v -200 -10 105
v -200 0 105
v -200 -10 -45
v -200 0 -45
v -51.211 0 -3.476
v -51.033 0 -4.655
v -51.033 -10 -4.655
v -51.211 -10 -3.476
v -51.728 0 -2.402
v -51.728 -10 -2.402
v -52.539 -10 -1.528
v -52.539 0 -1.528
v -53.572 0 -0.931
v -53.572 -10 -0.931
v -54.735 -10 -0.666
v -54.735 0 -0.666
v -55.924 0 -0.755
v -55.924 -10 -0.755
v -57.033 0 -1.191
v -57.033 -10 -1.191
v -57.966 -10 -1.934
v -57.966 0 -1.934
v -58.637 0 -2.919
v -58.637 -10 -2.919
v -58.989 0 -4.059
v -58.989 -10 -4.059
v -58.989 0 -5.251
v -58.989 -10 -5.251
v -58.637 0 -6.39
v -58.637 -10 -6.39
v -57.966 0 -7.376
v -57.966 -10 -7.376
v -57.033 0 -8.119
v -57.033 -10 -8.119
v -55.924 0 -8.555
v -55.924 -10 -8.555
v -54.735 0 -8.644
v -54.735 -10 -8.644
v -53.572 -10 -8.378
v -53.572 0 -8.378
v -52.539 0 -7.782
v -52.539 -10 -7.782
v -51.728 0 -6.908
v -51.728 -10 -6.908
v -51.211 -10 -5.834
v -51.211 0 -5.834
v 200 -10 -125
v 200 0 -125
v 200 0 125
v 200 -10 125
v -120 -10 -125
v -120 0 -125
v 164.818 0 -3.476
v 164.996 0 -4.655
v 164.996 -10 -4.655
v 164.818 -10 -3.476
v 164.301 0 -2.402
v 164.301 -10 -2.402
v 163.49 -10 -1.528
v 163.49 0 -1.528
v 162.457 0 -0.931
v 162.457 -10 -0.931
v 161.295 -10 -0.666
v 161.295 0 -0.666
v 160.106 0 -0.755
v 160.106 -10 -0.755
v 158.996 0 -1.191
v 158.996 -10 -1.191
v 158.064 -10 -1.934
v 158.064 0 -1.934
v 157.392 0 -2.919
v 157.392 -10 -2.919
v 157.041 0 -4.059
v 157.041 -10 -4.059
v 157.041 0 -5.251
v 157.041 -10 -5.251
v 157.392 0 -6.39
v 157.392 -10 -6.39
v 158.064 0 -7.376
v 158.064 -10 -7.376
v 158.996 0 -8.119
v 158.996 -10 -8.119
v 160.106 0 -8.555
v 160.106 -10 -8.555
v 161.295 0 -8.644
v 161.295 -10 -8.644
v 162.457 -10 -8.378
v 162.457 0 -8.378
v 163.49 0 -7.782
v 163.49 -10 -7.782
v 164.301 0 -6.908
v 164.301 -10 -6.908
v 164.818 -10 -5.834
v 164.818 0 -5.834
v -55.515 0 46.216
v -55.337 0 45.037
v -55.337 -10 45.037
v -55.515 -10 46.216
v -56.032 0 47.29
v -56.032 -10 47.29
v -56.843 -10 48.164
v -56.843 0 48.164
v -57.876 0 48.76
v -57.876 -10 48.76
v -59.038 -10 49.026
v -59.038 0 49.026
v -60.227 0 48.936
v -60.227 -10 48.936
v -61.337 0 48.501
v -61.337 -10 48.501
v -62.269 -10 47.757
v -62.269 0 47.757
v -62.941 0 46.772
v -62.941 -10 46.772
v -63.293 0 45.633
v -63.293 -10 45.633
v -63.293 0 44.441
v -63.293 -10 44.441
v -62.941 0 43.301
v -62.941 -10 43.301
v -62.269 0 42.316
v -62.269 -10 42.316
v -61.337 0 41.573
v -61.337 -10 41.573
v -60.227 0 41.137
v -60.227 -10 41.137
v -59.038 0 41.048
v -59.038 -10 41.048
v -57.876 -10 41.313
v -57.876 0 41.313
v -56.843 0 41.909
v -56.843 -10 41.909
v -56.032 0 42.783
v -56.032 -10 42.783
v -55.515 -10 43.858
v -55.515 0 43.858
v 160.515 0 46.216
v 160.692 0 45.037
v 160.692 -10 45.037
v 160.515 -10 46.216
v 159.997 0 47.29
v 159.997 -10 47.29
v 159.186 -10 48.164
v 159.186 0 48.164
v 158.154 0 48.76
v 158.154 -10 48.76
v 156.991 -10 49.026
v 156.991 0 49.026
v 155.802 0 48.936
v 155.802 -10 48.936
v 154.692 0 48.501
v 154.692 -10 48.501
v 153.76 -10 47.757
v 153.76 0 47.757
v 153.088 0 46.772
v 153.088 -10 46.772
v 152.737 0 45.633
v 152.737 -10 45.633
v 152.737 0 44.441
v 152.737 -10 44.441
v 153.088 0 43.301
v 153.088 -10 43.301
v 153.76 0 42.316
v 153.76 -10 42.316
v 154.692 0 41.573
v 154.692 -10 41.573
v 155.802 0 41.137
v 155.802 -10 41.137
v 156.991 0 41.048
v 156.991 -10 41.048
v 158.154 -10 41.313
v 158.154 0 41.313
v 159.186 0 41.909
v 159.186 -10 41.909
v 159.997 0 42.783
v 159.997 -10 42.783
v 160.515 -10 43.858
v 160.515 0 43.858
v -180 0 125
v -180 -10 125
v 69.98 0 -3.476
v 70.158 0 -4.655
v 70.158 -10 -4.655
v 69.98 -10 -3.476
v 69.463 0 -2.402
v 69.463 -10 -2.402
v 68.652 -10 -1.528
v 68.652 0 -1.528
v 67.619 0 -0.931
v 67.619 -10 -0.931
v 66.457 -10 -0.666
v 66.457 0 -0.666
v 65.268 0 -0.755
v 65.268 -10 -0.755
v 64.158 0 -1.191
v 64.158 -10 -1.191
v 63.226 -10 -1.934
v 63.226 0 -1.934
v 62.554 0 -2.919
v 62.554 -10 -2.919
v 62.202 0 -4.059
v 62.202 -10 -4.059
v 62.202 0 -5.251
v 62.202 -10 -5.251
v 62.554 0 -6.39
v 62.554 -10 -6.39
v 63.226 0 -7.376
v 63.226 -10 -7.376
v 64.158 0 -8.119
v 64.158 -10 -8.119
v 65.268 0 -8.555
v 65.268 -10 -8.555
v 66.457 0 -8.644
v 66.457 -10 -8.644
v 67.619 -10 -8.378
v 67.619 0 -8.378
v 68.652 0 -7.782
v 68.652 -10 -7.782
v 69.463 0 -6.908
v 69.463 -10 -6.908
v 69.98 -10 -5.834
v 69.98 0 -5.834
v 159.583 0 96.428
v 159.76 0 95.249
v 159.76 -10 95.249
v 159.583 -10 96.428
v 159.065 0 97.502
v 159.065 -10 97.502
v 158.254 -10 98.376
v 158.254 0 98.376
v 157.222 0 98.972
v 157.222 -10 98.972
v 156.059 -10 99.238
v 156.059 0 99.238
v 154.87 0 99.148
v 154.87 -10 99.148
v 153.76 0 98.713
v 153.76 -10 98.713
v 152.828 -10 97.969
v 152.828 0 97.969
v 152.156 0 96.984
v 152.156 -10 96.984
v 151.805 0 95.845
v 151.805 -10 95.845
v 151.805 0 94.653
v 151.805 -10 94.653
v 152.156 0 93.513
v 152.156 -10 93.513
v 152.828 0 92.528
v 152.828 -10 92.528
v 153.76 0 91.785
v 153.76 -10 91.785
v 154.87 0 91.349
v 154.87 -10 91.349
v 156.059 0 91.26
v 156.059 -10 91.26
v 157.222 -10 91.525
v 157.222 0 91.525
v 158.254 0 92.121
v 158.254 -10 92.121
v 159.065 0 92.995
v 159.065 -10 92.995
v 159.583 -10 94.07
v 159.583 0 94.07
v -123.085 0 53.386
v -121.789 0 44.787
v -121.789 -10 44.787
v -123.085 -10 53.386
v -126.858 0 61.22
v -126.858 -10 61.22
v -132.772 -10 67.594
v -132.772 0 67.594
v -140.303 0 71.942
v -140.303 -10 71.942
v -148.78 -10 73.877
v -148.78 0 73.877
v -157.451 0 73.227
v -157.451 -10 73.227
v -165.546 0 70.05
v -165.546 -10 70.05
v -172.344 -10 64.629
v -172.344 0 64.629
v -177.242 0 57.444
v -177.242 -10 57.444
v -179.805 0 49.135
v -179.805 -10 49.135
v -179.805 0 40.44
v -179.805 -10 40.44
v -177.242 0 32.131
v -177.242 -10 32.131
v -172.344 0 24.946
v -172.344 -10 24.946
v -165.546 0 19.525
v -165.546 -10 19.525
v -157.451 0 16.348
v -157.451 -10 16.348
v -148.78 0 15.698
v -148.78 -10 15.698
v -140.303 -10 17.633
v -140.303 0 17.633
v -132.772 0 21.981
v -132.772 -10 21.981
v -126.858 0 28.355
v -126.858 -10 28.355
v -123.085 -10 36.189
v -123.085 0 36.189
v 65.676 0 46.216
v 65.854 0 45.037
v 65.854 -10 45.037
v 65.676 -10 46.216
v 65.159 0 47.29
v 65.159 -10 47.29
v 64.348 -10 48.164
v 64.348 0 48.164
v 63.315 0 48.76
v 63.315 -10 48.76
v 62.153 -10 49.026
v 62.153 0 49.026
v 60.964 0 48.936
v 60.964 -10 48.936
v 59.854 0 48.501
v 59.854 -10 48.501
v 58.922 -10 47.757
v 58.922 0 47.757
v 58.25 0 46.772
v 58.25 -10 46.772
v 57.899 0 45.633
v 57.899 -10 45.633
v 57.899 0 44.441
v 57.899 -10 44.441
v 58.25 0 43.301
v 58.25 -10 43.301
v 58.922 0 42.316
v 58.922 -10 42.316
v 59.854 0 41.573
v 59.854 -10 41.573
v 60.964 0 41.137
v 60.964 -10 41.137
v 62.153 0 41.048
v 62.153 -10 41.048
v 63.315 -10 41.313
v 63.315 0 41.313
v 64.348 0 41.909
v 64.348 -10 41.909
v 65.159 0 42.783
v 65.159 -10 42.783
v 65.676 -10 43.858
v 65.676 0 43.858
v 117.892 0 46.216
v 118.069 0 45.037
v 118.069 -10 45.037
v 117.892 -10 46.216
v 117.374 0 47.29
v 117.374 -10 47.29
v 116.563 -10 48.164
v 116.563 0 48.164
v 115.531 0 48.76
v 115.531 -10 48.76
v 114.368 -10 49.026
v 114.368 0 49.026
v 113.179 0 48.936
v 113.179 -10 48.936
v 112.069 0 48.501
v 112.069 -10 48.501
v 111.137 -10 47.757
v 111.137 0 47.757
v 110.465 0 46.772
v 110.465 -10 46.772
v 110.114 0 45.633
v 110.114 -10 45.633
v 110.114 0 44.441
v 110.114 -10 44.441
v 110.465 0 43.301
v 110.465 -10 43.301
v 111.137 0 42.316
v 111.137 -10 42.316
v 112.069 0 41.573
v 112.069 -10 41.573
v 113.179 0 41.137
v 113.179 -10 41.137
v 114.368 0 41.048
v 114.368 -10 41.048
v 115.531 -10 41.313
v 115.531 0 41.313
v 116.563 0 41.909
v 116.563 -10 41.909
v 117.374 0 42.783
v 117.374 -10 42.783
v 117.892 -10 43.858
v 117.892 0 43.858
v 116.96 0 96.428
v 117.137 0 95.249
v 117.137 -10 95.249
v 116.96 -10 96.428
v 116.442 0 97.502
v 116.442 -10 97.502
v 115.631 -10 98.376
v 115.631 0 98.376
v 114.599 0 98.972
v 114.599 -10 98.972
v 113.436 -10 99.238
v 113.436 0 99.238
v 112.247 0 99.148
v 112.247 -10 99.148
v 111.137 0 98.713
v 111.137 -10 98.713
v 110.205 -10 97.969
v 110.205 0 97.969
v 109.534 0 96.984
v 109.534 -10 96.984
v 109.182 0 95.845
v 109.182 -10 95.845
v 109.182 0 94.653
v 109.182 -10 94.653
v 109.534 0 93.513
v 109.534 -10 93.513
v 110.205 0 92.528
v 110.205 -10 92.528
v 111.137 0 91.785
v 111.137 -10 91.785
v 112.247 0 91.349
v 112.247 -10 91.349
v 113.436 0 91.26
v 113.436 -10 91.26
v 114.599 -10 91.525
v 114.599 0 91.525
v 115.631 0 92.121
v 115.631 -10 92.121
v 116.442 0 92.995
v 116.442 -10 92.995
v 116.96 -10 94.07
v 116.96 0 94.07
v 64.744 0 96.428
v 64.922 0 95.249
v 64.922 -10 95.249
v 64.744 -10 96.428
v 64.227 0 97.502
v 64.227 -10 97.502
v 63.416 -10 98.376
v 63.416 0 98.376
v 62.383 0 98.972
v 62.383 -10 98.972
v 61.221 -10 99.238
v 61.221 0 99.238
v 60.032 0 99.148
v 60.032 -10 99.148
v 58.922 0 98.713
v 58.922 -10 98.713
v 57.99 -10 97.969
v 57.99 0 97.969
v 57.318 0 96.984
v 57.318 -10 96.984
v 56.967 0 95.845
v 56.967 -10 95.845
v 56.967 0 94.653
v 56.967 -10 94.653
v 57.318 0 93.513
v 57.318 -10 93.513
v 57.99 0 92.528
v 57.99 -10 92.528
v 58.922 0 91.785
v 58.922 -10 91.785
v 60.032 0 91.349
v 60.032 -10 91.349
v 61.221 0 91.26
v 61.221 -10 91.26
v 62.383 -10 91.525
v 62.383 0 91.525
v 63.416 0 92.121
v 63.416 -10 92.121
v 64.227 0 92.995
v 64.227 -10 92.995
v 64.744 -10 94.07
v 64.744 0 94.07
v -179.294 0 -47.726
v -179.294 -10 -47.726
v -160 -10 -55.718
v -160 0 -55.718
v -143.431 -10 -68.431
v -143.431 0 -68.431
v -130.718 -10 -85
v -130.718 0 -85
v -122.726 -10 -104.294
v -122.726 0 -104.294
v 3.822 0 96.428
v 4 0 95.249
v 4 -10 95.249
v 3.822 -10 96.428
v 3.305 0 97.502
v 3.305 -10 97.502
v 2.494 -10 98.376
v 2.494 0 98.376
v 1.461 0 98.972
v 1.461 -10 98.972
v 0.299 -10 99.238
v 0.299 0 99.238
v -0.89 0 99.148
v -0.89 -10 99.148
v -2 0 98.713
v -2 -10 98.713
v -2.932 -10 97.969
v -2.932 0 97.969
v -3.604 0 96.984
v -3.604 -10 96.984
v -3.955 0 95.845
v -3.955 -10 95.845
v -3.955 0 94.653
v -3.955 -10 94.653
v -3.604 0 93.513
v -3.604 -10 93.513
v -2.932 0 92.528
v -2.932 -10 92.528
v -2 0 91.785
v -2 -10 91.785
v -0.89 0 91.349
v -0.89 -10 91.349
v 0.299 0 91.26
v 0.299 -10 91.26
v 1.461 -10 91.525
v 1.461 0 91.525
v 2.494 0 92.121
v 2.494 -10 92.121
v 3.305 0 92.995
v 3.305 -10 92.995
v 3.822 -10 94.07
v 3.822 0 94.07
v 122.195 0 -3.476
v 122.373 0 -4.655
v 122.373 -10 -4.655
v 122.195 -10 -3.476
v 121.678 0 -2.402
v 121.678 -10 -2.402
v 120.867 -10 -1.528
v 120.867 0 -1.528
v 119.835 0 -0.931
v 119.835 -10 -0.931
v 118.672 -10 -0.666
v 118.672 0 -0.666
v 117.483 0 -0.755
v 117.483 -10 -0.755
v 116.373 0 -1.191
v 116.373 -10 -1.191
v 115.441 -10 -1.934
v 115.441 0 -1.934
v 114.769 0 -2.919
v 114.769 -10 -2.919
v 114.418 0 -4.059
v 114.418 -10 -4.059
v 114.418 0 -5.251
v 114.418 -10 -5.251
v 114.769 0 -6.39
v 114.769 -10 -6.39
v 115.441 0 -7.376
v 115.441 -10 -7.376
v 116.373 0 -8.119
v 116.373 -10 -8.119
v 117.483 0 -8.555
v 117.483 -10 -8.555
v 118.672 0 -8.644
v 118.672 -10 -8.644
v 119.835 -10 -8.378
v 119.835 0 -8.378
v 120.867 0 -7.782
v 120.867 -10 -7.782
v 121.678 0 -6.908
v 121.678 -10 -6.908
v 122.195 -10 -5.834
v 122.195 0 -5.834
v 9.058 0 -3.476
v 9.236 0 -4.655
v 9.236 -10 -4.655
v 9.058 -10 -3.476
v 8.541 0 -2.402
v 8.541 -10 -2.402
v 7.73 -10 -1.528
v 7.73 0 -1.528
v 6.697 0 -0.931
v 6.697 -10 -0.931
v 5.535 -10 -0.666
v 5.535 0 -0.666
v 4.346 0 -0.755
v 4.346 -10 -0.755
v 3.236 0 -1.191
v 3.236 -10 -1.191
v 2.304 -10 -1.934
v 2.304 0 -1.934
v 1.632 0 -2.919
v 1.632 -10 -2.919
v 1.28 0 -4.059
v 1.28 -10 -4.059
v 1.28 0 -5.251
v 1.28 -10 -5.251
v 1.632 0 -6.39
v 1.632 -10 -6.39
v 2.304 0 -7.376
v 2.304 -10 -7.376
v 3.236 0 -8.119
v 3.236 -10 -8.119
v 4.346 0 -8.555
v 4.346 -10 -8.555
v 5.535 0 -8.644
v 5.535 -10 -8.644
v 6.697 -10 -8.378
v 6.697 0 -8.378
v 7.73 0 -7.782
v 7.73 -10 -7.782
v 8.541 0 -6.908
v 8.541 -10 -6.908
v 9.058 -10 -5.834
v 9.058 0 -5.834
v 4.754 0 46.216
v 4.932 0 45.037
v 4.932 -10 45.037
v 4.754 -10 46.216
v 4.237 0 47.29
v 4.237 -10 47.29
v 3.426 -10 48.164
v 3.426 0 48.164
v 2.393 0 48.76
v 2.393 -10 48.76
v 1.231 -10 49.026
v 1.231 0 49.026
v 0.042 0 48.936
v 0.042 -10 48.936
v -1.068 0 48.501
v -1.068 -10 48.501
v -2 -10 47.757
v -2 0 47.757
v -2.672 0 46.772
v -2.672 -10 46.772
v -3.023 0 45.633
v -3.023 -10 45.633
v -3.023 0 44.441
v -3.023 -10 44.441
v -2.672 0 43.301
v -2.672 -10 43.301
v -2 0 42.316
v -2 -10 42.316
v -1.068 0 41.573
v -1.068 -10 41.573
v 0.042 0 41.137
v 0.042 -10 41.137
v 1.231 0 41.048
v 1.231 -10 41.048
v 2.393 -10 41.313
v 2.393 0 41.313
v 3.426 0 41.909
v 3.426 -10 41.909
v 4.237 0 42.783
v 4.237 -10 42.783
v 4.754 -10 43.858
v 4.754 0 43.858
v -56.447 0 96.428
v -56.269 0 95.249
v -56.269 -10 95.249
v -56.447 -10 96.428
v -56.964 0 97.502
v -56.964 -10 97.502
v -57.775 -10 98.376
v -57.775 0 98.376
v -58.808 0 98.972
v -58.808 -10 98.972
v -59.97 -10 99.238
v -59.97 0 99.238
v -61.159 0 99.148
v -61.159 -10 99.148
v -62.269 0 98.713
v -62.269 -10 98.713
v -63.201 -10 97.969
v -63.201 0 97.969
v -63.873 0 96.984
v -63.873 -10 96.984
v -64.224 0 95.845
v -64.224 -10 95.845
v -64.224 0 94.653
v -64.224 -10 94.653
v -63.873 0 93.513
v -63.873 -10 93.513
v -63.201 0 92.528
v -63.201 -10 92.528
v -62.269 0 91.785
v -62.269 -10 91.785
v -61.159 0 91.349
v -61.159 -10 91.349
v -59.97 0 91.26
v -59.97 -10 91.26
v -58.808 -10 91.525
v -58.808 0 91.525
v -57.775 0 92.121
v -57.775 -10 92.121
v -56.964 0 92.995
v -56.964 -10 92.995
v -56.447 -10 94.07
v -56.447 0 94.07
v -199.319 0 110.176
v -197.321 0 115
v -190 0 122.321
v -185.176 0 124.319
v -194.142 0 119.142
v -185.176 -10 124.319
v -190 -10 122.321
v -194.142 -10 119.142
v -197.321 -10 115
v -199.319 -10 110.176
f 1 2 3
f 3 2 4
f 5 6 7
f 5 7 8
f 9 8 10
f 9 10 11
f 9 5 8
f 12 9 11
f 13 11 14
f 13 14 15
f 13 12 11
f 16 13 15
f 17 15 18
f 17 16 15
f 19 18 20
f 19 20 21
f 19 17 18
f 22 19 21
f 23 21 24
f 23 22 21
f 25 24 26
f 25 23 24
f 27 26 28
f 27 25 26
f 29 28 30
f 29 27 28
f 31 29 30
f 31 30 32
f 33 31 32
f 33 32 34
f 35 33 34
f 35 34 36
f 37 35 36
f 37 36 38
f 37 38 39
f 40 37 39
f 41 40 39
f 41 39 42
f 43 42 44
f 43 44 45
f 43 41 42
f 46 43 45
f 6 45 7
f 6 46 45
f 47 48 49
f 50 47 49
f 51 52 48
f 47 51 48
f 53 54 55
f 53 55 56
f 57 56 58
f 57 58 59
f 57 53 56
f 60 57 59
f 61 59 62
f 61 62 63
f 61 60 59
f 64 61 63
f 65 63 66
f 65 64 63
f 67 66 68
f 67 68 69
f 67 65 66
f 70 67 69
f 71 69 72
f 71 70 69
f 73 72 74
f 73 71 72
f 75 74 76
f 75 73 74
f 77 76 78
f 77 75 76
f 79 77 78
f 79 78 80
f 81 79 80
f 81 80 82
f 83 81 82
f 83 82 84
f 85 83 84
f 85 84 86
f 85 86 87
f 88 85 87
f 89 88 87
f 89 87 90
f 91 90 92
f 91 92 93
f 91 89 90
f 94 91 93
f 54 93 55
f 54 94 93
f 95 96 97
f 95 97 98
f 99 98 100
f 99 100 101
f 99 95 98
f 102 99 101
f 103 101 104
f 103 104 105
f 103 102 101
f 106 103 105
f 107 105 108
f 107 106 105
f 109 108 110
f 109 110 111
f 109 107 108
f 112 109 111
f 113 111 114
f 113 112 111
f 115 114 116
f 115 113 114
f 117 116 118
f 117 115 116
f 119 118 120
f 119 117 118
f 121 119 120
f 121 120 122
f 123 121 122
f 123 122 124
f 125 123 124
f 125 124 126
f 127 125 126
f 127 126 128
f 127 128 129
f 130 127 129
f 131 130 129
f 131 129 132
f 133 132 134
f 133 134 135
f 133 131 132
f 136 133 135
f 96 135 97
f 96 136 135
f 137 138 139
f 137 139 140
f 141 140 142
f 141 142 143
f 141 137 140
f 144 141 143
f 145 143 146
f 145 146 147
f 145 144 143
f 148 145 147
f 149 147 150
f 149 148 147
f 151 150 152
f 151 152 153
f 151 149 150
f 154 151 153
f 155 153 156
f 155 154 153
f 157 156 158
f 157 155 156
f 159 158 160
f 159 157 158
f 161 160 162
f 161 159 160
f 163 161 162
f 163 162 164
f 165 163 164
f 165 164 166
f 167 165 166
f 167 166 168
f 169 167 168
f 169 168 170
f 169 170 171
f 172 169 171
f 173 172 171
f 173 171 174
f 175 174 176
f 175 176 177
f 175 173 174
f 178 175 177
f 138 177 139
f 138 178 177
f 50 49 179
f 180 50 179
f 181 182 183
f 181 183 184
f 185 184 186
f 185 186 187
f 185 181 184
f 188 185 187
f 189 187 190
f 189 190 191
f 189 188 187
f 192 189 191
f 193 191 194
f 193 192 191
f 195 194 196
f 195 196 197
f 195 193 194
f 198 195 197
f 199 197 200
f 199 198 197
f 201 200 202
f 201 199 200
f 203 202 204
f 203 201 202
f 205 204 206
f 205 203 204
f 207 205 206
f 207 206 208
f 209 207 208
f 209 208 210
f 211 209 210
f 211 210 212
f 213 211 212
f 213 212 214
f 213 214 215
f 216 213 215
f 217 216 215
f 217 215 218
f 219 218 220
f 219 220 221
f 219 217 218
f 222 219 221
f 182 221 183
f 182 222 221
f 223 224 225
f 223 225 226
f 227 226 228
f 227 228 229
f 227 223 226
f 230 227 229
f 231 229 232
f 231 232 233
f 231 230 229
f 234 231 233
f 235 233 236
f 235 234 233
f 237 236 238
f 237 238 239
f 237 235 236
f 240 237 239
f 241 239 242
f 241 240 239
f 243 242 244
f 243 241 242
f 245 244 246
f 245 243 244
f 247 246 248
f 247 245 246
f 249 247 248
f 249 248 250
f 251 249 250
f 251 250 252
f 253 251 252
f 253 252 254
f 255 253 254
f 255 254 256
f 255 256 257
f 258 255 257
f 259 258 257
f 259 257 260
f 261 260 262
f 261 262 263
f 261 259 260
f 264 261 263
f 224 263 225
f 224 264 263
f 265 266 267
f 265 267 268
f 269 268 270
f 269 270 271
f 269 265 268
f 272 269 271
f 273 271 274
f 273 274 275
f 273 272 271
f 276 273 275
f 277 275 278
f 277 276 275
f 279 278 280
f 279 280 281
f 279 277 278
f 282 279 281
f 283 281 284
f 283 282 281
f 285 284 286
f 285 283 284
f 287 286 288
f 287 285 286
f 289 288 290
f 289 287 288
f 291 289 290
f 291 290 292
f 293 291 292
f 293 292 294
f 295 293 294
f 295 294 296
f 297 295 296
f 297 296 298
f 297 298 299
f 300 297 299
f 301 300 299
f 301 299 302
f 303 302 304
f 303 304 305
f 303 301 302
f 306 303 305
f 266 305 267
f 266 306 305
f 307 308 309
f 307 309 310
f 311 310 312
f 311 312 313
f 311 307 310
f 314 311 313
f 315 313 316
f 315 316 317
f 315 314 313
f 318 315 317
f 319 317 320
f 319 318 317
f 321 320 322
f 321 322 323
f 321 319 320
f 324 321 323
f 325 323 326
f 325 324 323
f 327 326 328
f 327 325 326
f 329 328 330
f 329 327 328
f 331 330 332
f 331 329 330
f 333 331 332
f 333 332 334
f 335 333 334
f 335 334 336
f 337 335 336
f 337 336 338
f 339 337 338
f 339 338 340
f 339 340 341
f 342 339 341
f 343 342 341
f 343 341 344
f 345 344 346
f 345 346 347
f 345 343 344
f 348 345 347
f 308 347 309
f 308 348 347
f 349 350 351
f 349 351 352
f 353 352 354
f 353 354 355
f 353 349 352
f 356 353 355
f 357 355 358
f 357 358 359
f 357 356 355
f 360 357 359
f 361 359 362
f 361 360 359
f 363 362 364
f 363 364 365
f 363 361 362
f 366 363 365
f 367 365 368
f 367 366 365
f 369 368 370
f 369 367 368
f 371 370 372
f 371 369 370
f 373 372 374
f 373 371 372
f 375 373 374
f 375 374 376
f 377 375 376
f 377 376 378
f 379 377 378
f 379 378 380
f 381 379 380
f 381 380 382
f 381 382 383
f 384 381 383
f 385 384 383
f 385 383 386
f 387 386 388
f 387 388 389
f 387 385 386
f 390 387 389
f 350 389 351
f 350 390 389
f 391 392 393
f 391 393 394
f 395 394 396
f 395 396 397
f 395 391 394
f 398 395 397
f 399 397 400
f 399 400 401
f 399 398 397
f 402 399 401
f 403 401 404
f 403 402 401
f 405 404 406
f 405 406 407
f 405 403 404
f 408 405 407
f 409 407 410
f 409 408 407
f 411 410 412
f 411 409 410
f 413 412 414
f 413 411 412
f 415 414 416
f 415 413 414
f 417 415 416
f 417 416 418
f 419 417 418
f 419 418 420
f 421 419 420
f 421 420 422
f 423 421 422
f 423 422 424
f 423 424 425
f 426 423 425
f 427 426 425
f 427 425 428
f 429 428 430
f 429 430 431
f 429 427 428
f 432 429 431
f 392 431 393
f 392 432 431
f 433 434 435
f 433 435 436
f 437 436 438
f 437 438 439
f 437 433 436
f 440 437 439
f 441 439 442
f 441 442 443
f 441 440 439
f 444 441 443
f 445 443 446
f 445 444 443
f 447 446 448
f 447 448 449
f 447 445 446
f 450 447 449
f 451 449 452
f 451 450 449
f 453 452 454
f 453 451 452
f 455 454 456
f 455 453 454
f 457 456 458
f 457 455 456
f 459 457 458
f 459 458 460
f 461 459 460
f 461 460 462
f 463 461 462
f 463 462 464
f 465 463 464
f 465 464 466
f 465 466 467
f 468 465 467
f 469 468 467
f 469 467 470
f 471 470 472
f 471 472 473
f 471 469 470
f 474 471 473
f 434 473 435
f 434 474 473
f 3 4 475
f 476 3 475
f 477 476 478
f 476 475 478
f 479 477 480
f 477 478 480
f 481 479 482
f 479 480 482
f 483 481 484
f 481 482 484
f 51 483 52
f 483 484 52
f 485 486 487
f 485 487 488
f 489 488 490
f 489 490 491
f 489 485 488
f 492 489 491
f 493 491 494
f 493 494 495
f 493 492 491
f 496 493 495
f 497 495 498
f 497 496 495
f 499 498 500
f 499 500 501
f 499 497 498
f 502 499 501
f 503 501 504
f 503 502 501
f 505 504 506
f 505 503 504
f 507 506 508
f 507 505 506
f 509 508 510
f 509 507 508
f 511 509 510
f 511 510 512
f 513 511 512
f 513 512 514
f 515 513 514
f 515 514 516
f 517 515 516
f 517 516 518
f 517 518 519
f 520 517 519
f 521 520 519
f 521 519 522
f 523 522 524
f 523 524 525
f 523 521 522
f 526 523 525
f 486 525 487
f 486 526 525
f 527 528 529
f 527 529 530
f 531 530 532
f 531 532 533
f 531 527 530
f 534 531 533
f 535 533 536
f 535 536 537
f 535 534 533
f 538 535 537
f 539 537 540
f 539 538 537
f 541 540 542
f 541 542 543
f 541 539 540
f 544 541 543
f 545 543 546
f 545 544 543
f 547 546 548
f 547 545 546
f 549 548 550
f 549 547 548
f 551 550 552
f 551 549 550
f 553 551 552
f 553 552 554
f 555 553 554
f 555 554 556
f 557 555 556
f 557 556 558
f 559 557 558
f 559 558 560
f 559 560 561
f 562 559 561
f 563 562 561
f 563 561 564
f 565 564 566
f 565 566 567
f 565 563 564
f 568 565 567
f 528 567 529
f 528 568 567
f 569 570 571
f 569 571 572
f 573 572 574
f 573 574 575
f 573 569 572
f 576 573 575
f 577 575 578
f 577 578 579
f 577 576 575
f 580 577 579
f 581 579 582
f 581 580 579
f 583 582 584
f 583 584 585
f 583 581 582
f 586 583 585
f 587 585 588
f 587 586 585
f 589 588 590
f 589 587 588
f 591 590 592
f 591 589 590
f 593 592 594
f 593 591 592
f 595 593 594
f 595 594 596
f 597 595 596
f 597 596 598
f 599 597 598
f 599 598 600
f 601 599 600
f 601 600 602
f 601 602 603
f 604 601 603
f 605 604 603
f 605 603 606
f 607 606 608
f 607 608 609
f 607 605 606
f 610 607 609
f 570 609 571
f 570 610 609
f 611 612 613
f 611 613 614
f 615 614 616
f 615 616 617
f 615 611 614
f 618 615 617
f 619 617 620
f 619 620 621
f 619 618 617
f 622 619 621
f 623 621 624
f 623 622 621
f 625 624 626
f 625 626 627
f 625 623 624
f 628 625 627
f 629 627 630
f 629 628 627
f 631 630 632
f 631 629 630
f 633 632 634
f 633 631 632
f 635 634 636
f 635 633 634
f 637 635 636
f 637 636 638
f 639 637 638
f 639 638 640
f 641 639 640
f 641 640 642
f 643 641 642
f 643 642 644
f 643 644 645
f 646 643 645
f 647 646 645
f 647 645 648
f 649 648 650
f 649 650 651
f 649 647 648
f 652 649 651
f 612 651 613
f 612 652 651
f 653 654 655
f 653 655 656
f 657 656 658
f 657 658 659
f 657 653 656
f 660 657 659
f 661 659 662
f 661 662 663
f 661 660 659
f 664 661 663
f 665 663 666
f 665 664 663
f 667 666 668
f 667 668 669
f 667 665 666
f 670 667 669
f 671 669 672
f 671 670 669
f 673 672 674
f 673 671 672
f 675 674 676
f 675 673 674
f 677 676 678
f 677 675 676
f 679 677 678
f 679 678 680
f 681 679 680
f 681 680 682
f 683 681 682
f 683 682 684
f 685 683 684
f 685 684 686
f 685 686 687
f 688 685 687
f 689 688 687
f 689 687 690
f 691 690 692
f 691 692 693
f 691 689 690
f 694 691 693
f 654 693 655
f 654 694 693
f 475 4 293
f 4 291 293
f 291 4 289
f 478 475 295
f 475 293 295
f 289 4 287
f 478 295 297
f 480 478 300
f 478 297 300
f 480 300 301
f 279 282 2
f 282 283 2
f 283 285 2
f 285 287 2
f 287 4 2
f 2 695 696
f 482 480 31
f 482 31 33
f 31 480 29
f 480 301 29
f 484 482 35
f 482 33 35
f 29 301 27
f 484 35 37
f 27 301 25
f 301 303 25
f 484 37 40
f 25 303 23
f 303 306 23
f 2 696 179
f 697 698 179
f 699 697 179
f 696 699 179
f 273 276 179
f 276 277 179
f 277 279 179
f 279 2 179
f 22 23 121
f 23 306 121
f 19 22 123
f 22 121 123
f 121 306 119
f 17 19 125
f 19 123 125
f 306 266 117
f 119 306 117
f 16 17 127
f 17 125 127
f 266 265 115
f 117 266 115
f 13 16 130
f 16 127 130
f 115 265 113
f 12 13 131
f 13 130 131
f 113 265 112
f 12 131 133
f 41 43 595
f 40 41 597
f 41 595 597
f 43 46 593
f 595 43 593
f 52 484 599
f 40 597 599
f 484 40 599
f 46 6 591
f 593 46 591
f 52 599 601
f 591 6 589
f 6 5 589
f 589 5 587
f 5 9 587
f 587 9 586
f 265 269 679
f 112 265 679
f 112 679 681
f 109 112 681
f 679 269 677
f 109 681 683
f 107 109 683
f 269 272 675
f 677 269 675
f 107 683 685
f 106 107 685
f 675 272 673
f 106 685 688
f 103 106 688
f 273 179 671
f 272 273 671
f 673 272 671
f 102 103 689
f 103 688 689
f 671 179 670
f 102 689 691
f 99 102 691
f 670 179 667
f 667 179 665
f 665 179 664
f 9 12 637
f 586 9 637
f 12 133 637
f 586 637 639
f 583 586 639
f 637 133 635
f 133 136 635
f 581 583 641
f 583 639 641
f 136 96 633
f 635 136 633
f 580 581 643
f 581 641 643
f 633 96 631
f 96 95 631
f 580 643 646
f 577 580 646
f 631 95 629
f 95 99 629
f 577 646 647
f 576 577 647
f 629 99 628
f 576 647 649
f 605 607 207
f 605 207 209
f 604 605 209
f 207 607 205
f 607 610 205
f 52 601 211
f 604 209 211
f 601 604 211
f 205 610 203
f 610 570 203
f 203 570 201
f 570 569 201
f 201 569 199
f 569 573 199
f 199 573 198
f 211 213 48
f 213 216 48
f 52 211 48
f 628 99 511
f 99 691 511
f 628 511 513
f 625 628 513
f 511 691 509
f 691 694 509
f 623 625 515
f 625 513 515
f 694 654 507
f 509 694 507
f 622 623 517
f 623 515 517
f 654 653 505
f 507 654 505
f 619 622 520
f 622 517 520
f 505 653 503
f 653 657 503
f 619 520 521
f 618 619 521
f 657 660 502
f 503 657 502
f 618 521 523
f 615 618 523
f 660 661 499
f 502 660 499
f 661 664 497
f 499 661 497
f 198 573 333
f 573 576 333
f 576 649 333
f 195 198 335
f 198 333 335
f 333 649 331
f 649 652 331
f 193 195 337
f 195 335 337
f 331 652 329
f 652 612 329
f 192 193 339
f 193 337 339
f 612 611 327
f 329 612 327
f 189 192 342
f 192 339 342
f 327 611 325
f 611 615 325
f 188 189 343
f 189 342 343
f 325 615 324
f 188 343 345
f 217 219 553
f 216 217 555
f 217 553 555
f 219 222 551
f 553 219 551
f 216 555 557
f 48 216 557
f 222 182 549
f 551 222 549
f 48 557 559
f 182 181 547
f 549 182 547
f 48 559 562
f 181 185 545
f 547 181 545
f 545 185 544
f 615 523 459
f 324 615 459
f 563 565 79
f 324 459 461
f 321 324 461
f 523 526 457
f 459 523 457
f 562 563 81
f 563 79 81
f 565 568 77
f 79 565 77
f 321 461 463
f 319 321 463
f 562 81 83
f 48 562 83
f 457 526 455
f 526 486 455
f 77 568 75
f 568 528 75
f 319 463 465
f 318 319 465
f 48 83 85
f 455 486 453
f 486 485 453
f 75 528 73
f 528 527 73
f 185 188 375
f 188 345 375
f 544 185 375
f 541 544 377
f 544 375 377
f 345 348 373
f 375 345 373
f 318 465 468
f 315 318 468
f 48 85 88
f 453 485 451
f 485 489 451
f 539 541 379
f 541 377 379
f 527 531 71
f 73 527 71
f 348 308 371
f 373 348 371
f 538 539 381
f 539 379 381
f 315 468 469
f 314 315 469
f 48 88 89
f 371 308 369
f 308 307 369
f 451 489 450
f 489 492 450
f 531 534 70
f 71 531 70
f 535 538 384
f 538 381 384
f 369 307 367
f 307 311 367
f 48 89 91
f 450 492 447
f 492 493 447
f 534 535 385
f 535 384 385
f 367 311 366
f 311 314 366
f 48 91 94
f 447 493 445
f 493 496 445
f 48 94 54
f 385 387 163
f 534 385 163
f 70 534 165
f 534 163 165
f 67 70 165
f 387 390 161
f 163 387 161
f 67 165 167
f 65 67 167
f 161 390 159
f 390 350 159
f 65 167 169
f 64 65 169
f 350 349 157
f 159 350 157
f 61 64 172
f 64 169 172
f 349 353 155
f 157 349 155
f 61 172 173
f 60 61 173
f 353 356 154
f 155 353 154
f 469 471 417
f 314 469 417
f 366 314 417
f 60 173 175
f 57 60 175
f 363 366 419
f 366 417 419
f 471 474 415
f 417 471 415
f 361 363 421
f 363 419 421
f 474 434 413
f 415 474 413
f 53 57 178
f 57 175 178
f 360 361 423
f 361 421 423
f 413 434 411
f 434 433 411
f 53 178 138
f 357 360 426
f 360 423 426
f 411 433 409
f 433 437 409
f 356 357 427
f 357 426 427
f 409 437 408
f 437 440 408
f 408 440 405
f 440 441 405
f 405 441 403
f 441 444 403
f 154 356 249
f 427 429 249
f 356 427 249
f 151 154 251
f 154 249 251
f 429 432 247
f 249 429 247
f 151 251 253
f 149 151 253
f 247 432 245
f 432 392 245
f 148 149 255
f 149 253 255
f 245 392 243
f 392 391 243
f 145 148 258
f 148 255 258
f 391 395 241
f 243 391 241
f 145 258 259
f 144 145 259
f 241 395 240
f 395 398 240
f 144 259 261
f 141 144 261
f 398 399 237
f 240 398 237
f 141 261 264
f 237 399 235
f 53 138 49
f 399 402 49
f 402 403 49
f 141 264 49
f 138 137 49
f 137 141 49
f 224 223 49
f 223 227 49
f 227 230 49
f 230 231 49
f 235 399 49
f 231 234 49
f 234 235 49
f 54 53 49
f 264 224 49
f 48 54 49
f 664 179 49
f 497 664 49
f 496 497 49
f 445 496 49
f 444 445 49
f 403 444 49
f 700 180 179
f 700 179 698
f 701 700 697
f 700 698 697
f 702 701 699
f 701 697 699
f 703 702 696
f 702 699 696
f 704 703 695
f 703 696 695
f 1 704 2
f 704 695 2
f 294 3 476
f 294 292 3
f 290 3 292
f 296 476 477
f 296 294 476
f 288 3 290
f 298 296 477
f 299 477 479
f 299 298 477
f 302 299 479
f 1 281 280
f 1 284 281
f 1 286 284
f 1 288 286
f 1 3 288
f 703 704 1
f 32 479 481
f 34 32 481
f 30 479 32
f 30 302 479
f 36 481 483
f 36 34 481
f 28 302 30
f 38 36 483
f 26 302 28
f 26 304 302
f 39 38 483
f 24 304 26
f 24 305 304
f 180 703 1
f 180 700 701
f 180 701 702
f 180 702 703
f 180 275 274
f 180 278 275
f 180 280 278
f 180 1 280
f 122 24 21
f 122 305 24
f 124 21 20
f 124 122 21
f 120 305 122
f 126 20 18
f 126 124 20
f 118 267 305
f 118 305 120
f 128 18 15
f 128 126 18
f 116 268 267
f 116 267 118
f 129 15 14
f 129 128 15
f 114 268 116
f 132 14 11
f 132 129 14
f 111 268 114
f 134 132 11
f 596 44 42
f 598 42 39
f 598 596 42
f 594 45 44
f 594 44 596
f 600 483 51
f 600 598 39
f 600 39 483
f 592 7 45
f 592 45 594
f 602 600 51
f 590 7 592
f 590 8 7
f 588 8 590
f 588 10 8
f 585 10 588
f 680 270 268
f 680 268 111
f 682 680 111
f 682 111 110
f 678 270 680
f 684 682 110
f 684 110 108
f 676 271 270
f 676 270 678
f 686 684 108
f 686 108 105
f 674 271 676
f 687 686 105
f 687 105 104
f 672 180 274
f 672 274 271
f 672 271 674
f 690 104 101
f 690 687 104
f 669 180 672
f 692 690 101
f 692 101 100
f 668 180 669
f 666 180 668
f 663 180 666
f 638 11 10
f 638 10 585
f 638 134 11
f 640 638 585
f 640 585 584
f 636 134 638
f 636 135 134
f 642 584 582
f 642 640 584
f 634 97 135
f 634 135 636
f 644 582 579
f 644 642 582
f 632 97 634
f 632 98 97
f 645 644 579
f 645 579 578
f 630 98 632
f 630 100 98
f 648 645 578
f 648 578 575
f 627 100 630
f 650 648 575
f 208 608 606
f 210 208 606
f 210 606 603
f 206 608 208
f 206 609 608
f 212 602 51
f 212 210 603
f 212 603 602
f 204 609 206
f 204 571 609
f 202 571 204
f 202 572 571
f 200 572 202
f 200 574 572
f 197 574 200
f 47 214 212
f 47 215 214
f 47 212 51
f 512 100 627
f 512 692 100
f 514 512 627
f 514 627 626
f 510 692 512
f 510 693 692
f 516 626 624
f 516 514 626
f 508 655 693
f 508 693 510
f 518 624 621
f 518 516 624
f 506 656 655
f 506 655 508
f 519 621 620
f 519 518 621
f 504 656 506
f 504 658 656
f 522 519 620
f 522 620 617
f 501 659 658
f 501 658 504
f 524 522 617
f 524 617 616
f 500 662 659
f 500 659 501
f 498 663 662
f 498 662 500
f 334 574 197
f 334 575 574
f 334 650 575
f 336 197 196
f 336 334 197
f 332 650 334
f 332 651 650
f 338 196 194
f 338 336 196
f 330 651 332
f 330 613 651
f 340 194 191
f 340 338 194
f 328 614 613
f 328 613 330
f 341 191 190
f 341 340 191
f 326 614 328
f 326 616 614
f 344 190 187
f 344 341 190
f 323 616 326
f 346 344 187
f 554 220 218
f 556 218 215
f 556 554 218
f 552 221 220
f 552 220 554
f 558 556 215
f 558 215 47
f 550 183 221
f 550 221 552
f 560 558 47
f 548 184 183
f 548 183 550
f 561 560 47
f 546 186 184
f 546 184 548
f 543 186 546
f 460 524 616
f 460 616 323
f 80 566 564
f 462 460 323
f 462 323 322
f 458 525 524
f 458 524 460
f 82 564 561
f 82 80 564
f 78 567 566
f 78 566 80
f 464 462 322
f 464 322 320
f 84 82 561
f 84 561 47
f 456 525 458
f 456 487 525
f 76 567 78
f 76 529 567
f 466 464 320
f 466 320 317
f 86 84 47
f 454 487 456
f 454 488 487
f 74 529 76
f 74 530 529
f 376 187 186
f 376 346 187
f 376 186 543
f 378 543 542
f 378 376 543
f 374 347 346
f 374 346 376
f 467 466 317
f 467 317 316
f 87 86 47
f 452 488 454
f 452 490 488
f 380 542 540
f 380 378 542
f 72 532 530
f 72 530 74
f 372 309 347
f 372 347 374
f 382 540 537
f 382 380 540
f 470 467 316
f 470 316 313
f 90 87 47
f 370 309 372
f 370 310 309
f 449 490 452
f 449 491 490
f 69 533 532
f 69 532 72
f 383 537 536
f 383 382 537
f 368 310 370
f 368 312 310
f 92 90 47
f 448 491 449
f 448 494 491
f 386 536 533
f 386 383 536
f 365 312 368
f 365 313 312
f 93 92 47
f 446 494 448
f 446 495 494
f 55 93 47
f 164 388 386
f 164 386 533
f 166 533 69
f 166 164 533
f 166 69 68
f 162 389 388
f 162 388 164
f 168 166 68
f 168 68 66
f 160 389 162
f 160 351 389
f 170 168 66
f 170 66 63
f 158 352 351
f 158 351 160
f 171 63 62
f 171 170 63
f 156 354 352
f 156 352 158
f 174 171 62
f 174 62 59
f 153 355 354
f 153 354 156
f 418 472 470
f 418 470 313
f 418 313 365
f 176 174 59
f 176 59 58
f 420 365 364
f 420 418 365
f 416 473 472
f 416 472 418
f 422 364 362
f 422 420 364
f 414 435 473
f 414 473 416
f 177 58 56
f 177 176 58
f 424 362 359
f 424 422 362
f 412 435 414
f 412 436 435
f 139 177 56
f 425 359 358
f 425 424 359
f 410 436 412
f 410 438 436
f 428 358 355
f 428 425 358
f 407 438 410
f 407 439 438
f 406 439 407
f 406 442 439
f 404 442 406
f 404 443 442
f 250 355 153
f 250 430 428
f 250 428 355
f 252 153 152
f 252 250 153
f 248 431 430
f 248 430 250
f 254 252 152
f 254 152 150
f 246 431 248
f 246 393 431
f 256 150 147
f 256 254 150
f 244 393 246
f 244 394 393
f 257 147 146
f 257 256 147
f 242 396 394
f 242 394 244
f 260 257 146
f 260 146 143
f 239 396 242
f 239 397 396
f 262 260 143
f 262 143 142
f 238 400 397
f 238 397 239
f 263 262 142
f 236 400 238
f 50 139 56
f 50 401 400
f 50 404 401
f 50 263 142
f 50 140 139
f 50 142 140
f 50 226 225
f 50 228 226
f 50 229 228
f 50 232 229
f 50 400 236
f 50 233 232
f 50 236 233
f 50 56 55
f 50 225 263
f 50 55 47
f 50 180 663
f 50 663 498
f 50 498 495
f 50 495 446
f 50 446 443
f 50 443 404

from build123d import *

# Parameters (mm, degrees)
F0_R     = 4
F0_R_2   = 29.171031
F1_DEPTH = 10


with BuildPart() as f1:
    # F0 (on Front) → F1 (new body)
    with BuildSketch(Plane.XZ):
        with BuildLine():
            Line((200, 125), (-180, 125))
            ThreePointArc((-180, 125), (-194.142136, 119.142136), (-200, 105))
            Line((-200, 105), (-200, -45))
            ThreePointArc((-200, -45), (-143.431458, -68.431458), (-120, -125))
            Line((-120, -125), (200, -125))
            Line((200, -125), (200, 125))
        make_face()
        with Locations((-55.033423, -4.654916)):
            Circle(F0_R, mode=Mode.SUBTRACT)
        with Locations((5.235739, -4.654916)):
            Circle(F0_R, mode=Mode.SUBTRACT)
        with Locations((66.157822, -4.654916)):
            Circle(F0_R, mode=Mode.SUBTRACT)
        with Locations((118.3732, -4.654916)):
            Circle(F0_R, mode=Mode.SUBTRACT)
        with Locations((160.996102, -4.654916)):
            Circle(F0_R, mode=Mode.SUBTRACT)
        with Locations((-150.960162, 44.787358)):
            Circle(F0_R_2, mode=Mode.SUBTRACT)
        with Locations((-59.337278, 45.036767)):
            Circle(F0_R, mode=Mode.SUBTRACT)
        with Locations((-60.269162, 95.248777)):
            Circle(F0_R, mode=Mode.SUBTRACT)
        with Locations((0.931884, 45.036767)):
            Circle(F0_R, mode=Mode.SUBTRACT)
        with Locations((61.853966, 45.036767)):
            Circle(F0_R, mode=Mode.SUBTRACT)
        with Locations((114.069345, 45.036767)):
            Circle(F0_R, mode=Mode.SUBTRACT)
        with Locations((156.692246, 45.036767)):
            Circle(F0_R, mode=Mode.SUBTRACT)
        with Locations((0, 95.248777)):
            Circle(F0_R, mode=Mode.SUBTRACT)
        with Locations((60.922083, 95.248777)):
            Circle(F0_R, mode=Mode.SUBTRACT)
        with Locations((113.137461, 95.248777)):
            Circle(F0_R, mode=Mode.SUBTRACT)
        with Locations((155.760363, 95.248777)):
            Circle(F0_R, mode=Mode.SUBTRACT)
    extrude(amount=F1_DEPTH)


solid = f1.part
